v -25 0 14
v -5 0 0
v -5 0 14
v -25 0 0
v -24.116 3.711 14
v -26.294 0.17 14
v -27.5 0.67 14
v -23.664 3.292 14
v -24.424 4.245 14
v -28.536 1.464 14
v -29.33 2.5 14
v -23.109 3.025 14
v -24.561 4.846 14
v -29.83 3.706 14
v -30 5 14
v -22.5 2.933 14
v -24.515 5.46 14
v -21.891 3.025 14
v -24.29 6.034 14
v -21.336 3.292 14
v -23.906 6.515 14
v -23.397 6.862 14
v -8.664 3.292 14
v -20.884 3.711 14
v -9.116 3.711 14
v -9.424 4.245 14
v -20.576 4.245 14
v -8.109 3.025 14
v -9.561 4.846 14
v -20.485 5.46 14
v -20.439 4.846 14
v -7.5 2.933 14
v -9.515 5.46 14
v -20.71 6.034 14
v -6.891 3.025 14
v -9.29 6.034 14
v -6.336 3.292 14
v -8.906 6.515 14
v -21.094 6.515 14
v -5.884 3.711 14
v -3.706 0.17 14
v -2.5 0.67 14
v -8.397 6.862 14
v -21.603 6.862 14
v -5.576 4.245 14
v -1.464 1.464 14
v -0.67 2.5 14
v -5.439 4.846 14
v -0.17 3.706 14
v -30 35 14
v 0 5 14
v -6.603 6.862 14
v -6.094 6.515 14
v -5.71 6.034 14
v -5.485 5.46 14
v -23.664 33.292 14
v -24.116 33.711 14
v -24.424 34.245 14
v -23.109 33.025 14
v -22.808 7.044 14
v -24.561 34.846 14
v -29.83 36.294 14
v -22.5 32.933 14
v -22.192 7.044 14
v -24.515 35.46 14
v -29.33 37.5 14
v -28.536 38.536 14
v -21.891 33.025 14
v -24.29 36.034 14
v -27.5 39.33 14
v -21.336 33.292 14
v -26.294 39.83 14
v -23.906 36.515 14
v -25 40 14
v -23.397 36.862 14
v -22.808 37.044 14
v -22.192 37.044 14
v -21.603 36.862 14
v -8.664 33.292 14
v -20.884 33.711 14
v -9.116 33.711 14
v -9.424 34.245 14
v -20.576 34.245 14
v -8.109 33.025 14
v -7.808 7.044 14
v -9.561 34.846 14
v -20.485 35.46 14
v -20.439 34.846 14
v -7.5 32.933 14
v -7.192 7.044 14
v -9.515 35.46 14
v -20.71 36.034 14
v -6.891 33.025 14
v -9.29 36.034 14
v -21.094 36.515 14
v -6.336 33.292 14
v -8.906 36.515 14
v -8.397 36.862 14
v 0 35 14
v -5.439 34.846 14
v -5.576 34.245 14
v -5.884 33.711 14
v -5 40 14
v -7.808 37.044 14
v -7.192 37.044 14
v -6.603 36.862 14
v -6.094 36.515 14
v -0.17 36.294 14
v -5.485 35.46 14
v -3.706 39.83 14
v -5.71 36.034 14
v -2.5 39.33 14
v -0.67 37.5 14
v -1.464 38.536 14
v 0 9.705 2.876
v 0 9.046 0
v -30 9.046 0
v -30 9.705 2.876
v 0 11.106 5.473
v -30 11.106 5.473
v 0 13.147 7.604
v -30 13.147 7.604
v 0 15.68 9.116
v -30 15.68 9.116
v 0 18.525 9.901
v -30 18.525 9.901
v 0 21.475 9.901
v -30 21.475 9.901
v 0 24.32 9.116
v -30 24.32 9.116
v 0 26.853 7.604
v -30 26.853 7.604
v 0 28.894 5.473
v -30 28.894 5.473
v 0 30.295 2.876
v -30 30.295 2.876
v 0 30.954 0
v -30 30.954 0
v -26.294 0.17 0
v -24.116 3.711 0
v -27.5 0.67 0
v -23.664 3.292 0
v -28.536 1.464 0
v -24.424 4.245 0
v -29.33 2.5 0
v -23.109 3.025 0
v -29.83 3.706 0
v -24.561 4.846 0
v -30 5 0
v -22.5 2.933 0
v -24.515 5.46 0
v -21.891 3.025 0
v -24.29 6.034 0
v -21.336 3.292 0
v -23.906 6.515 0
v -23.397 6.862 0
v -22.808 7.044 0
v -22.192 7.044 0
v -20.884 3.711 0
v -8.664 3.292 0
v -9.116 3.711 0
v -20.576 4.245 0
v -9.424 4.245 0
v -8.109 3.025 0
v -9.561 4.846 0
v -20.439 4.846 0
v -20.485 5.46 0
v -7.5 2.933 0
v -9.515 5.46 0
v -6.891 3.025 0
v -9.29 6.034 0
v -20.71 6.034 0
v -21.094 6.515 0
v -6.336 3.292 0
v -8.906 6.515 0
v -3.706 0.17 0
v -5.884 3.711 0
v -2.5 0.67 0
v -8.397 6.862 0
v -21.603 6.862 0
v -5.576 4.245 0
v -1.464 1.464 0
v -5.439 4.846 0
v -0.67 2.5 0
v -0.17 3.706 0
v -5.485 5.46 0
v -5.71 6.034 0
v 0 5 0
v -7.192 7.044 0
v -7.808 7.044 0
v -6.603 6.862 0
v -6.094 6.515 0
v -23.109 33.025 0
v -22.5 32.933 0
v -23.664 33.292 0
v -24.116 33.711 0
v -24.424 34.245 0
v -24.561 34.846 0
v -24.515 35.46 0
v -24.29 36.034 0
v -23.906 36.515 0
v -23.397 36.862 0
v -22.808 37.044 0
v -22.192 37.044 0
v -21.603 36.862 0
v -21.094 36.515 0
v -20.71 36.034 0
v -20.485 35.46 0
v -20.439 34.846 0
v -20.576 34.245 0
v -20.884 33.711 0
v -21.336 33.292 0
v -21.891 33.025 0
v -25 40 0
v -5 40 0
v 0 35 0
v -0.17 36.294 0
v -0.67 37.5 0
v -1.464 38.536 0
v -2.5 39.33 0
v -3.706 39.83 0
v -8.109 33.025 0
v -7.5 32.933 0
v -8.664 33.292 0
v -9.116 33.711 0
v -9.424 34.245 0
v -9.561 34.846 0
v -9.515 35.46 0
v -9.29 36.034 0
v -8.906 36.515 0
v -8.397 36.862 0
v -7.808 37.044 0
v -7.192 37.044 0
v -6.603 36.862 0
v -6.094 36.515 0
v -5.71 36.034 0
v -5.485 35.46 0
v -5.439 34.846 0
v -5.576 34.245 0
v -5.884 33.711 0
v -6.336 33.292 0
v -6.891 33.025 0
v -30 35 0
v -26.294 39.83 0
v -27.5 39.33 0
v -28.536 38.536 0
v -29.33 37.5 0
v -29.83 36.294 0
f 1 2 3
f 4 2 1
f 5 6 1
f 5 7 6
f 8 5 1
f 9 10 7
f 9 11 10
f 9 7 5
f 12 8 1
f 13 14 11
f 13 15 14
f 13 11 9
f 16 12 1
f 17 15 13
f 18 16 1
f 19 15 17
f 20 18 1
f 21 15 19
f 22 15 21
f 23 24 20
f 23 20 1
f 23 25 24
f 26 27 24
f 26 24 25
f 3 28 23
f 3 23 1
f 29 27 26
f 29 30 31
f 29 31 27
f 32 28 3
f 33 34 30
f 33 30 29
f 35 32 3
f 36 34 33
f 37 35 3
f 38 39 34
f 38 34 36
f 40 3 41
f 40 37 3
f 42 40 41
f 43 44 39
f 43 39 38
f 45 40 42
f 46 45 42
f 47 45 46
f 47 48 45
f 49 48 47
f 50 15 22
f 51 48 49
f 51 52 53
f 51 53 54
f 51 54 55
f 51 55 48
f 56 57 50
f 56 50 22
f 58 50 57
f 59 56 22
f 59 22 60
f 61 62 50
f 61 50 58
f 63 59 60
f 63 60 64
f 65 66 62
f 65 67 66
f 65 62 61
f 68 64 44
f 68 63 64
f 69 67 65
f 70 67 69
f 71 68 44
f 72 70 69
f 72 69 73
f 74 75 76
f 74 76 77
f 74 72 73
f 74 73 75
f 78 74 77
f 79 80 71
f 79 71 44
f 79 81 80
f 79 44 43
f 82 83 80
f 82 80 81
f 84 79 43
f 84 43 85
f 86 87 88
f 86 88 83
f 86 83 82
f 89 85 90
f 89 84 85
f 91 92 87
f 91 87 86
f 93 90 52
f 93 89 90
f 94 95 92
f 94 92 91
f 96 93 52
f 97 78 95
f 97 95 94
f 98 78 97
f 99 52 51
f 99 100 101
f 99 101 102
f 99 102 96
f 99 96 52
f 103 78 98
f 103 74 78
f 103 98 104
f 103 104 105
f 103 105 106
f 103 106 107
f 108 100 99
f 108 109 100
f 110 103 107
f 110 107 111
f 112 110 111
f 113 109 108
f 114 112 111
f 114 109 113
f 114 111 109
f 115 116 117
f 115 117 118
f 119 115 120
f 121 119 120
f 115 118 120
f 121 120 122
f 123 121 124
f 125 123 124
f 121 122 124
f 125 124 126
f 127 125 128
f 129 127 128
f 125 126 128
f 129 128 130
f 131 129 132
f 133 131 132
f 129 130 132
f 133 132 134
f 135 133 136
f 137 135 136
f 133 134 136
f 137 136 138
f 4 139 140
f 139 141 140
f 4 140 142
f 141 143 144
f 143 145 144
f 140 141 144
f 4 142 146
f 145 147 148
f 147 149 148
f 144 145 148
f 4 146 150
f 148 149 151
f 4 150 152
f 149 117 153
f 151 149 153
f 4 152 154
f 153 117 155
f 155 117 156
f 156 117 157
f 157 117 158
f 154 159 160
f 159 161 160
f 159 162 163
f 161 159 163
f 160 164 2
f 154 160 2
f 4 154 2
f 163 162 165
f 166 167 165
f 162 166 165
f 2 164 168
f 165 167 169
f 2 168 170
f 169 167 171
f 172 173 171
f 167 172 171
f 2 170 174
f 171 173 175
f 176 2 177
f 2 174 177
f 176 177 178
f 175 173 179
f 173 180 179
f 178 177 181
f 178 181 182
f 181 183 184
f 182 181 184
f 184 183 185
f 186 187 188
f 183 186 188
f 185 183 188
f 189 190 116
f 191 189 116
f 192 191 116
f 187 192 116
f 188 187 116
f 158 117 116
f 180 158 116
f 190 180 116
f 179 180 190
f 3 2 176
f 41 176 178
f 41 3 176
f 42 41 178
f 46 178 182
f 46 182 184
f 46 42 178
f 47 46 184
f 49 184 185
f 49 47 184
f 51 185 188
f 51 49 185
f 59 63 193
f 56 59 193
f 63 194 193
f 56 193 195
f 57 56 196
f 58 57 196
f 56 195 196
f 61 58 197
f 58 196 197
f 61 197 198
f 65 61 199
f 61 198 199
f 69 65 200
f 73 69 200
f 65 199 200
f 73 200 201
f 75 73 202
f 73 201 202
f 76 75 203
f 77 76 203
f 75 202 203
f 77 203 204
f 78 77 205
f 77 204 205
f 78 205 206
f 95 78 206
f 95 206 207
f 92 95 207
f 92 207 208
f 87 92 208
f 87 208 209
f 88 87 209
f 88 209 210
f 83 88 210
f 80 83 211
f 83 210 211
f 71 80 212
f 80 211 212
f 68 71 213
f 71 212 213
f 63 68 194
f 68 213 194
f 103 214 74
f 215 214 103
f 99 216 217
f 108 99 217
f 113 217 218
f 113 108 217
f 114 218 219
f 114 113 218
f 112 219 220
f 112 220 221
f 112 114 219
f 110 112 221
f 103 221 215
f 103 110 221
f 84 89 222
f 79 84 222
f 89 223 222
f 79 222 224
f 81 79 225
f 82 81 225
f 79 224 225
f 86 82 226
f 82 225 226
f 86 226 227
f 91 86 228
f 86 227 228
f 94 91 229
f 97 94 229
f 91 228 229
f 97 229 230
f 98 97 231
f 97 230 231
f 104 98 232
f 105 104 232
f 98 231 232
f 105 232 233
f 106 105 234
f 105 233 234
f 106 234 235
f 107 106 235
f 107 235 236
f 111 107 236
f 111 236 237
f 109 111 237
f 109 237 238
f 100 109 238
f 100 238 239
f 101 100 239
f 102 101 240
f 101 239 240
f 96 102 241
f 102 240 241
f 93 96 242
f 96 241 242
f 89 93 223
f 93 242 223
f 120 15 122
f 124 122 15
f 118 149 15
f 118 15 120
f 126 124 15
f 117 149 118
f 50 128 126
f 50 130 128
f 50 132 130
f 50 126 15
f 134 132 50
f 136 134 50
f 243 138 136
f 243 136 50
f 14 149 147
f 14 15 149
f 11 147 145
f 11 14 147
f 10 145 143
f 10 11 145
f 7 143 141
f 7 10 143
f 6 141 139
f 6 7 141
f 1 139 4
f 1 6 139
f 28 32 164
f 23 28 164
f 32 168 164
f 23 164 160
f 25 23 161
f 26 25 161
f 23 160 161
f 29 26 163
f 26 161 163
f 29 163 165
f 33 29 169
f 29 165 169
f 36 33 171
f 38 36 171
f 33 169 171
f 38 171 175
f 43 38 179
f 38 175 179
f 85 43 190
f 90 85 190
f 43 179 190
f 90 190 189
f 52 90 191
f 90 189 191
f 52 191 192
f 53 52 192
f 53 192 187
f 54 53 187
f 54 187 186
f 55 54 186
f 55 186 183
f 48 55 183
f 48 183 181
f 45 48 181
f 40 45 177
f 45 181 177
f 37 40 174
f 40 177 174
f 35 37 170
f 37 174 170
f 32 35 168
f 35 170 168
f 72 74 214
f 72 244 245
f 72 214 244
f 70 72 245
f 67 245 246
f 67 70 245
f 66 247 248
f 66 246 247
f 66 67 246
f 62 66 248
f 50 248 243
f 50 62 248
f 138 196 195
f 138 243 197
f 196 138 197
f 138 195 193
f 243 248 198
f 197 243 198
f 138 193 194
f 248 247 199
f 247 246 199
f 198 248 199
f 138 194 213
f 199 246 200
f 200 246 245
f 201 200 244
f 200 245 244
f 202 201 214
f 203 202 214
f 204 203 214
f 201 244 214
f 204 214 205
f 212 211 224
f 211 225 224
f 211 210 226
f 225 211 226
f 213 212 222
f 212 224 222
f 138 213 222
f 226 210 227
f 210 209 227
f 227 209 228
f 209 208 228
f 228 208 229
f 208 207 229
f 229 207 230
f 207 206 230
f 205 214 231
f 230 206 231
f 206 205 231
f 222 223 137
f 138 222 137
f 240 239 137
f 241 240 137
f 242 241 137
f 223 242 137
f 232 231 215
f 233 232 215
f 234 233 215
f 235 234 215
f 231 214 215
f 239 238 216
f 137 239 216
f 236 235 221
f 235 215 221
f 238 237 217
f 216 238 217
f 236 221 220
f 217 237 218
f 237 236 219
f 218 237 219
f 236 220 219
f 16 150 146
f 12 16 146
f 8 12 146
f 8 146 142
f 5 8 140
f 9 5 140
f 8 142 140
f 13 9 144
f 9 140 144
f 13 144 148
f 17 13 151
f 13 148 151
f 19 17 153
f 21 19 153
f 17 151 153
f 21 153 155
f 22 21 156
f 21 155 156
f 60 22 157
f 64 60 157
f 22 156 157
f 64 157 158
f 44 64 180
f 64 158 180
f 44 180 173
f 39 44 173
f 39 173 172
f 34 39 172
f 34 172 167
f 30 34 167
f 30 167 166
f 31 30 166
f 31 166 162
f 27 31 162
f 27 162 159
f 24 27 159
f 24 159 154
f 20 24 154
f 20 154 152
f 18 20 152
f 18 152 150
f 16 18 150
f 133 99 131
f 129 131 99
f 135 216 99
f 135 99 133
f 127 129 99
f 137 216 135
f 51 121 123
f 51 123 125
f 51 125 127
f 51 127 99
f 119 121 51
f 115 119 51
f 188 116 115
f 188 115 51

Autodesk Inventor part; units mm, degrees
ref_plane "YZ Plane" through (0, 0, 0) normal (1, 0, 0) x (0, 1, 0)
ref_plane "XZ Plane" through (0, 0, 0) normal (0, 1, 0) x (-1, 0, 0)
ref_plane "XY Plane" through (0, 0, 0) normal (0, 0, 1) x (1, 0, 0)
sketch "Sketch4" plane through (0, 0, 0) normal (0, 0, 1) x (1, 0, 0)
  line L0 (0, 0) -> (-30, 0)
  line L1 (-30, 0) -> (-30, 40)
  line L2 (-30, 40) -> (0, 40)
  line L3 (0, 40) -> (0, 0)
  dimension "d37" = 30
  dimension "d38" = 40
extrude "Extrusion2" add sketch "Sketch4" along normal blind 14
hole "Hole3" at (-22.5, 35, 14) direction (0, 0, -1) diameter 4.134 depth 14.2 tip angle 118 thread size "M5x0.8" class "6H" standard "ISO Metric profile"
hole "Hole4" at (-7.5, 35, 14) direction (0, 0, -1) diameter 4.134 depth 14.2 tip angle 118 thread size "M5x0.8" class "6H" standard "ANSI Metric M Profile"
hole "Hole5" at (-7.5, 5, 14) direction (0, 0, -1) diameter 4.134 depth 14.2 tip angle 118 thread size "M5x0.8" class "6H" standard "ANSI Metric M Profile"
hole "Hole6" at (-22.5, 5, 14) direction (0, 0, -1) diameter 4.134 depth 14.2 tip angle 118 thread size "M5x0.8" class "6H" standard "ANSI Metric M Profile"
hole "Hole7" at (0, 20, -1) direction (-1, 0, 0) diameter 22 end through all
fillet "Fillet1" radius 5 4 edges at (-30, 40, 7) (0, 40, 7) (0, 0, 7) (-30, 0, 7)
properties part number "GARFO" material "Aluminium AW-7020"
